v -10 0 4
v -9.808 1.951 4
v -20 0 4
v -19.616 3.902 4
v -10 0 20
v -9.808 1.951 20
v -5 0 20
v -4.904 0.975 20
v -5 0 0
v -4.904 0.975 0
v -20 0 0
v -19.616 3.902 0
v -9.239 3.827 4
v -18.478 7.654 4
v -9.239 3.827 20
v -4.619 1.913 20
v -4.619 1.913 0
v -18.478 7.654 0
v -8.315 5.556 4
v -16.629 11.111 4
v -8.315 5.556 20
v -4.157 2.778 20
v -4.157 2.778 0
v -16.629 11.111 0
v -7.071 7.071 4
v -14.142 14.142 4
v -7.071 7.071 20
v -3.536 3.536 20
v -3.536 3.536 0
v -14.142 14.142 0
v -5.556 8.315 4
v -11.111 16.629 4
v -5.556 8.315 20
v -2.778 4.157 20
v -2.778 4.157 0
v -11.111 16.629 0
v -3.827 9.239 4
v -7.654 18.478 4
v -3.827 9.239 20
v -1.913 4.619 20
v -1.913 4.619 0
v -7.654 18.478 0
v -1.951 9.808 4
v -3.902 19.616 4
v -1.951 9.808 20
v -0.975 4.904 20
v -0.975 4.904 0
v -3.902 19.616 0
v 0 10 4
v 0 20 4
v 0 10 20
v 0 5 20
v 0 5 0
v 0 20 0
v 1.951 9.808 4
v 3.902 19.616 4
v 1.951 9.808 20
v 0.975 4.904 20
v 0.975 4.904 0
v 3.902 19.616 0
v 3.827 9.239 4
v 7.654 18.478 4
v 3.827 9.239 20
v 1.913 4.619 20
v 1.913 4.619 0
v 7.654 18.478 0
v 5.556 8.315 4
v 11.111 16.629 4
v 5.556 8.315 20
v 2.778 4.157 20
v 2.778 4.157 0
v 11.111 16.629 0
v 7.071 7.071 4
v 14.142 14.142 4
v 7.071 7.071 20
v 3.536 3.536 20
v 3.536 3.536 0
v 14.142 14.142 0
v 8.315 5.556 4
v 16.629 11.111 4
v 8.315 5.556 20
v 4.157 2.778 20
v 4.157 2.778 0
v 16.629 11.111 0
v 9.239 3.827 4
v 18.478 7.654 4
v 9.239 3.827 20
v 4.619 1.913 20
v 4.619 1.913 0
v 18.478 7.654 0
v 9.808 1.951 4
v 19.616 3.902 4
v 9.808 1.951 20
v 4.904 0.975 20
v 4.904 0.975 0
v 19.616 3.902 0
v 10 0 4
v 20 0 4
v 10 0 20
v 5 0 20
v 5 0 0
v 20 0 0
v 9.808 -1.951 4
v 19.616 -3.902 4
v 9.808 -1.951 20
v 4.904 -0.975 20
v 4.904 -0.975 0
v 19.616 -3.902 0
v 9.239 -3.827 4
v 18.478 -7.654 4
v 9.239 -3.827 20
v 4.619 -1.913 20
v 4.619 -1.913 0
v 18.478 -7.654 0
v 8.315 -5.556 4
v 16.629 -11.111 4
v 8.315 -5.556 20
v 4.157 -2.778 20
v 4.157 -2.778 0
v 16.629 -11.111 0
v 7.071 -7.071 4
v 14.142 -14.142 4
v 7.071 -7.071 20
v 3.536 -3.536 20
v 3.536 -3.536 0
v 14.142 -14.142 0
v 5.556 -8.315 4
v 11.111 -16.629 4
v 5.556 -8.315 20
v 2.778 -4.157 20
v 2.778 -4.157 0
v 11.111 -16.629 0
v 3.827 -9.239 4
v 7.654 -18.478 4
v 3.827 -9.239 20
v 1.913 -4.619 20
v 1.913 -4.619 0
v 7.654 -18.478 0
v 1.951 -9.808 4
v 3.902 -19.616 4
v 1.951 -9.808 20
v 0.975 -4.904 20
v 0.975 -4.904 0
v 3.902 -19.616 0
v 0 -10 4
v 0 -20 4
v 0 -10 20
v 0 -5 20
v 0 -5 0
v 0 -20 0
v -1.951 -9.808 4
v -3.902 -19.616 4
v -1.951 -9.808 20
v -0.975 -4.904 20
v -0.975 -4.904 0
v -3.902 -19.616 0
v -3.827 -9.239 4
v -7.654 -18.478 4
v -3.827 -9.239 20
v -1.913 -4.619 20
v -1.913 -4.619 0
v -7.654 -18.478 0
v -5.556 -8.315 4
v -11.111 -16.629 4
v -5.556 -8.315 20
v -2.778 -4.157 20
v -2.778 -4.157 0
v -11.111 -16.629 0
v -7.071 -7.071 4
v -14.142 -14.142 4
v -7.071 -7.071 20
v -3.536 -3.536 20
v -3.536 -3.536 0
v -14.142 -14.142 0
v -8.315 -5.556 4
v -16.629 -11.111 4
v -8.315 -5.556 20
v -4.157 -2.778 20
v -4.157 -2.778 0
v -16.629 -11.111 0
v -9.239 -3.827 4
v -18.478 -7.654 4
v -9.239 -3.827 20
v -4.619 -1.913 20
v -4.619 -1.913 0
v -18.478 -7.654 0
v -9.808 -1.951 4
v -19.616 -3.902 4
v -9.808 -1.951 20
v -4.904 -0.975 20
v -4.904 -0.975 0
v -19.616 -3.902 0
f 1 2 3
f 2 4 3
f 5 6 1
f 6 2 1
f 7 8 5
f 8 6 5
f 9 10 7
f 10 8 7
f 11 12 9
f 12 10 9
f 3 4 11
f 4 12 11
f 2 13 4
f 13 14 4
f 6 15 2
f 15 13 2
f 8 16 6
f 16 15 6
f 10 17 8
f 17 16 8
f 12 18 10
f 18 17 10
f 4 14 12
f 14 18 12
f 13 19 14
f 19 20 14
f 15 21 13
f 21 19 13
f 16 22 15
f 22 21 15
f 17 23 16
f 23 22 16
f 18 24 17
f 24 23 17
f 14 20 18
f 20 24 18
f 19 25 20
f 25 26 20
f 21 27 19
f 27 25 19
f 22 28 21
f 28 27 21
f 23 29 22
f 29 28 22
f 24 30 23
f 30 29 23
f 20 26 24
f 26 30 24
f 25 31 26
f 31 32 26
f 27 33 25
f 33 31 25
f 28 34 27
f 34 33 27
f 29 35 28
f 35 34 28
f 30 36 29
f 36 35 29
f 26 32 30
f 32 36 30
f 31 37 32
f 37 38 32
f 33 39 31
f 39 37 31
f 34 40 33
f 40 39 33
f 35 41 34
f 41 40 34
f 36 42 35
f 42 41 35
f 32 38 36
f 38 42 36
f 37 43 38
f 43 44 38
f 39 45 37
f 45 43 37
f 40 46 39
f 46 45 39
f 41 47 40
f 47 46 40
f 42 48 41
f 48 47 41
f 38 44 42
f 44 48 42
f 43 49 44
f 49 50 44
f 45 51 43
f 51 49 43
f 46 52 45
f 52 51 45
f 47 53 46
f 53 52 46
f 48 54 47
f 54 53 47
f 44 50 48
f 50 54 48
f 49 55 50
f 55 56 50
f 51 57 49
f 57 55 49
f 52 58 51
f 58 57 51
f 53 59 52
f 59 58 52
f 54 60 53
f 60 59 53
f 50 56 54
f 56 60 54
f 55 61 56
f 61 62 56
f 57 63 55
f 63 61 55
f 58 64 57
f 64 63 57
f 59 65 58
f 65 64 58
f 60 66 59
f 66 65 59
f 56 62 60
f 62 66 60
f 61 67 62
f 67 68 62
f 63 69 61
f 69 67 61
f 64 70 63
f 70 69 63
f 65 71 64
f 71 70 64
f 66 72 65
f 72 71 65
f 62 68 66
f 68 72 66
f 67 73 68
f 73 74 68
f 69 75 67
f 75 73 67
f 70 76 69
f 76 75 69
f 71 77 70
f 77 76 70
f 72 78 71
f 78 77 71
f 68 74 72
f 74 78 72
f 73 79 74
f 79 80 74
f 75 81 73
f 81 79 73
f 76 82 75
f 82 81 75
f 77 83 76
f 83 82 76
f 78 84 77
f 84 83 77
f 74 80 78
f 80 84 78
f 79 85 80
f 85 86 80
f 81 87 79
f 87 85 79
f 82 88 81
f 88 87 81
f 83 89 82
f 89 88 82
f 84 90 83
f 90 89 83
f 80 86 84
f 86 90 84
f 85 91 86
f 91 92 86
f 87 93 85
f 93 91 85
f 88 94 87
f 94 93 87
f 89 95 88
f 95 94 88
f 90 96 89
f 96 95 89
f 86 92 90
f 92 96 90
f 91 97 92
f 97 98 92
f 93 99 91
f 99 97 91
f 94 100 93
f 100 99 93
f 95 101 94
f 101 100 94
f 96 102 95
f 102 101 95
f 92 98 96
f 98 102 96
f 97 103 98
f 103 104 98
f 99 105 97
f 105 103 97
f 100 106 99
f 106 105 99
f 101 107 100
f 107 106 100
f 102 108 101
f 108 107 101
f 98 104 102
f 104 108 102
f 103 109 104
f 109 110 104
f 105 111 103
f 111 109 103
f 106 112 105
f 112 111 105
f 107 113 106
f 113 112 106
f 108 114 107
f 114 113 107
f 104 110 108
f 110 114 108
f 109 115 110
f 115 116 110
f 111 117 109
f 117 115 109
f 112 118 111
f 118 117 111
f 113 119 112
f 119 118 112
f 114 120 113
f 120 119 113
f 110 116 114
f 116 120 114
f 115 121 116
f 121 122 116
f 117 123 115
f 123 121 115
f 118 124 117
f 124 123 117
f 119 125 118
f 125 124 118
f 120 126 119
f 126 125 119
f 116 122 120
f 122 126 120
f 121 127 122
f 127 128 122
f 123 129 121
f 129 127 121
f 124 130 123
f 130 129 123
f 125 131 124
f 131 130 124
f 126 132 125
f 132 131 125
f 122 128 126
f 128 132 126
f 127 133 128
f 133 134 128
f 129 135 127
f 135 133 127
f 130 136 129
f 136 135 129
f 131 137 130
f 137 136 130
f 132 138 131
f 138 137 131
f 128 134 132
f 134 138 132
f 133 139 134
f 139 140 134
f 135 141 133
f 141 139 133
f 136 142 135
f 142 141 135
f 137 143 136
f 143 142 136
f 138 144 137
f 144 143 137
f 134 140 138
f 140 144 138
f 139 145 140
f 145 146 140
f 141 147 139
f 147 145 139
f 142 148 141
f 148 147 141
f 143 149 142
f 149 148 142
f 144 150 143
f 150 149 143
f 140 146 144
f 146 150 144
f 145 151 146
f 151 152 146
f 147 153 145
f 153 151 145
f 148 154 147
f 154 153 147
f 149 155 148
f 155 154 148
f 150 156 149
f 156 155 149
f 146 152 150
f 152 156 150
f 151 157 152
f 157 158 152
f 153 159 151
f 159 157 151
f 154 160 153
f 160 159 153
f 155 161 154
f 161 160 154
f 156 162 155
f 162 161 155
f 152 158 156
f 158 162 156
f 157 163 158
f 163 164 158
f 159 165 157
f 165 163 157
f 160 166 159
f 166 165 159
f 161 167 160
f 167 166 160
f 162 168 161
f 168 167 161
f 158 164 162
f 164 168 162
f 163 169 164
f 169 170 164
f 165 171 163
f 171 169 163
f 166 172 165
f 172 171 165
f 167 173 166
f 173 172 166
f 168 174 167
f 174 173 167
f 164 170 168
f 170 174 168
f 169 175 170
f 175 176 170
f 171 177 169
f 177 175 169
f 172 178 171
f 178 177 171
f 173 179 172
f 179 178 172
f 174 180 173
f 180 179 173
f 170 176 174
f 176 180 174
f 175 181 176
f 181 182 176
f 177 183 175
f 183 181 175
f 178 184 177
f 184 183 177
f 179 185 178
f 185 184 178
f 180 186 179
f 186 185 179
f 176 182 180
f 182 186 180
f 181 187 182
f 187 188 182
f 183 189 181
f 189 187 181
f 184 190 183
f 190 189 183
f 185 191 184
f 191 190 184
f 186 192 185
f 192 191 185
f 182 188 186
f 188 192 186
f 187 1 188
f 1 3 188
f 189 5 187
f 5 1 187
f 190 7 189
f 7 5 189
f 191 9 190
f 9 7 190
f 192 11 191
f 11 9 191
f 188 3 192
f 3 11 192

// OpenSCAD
$fn = 32;

// ----------------------------------------------------------------------
// Revolved part: flanged bushing R20
// ----------------------------------------------------------------------

// --- parameters (mm) ---
bore_r = 5;               // bore radius
flange_r = 20;            // flange radius
flange_h = 4;             // flange thickness
sleeve_r = 10;            // sleeve radius
total_h = 20;             // overall height
revolve_angle = 360;      // revolve sweep, degrees

bore_d = 2 * bore_r;
flange_d = 2 * flange_r;
sleeve_d = 2 * sleeve_r;

profile = [[5, 0], [20, 0], [20, 4], [10, 4], [10, 20], [5, 20]];  // primary outline, 6 points, counter clockwise

// --- the one profile operation ---
rotate_extrude(angle = revolve_angle) polygon(points = profile);
